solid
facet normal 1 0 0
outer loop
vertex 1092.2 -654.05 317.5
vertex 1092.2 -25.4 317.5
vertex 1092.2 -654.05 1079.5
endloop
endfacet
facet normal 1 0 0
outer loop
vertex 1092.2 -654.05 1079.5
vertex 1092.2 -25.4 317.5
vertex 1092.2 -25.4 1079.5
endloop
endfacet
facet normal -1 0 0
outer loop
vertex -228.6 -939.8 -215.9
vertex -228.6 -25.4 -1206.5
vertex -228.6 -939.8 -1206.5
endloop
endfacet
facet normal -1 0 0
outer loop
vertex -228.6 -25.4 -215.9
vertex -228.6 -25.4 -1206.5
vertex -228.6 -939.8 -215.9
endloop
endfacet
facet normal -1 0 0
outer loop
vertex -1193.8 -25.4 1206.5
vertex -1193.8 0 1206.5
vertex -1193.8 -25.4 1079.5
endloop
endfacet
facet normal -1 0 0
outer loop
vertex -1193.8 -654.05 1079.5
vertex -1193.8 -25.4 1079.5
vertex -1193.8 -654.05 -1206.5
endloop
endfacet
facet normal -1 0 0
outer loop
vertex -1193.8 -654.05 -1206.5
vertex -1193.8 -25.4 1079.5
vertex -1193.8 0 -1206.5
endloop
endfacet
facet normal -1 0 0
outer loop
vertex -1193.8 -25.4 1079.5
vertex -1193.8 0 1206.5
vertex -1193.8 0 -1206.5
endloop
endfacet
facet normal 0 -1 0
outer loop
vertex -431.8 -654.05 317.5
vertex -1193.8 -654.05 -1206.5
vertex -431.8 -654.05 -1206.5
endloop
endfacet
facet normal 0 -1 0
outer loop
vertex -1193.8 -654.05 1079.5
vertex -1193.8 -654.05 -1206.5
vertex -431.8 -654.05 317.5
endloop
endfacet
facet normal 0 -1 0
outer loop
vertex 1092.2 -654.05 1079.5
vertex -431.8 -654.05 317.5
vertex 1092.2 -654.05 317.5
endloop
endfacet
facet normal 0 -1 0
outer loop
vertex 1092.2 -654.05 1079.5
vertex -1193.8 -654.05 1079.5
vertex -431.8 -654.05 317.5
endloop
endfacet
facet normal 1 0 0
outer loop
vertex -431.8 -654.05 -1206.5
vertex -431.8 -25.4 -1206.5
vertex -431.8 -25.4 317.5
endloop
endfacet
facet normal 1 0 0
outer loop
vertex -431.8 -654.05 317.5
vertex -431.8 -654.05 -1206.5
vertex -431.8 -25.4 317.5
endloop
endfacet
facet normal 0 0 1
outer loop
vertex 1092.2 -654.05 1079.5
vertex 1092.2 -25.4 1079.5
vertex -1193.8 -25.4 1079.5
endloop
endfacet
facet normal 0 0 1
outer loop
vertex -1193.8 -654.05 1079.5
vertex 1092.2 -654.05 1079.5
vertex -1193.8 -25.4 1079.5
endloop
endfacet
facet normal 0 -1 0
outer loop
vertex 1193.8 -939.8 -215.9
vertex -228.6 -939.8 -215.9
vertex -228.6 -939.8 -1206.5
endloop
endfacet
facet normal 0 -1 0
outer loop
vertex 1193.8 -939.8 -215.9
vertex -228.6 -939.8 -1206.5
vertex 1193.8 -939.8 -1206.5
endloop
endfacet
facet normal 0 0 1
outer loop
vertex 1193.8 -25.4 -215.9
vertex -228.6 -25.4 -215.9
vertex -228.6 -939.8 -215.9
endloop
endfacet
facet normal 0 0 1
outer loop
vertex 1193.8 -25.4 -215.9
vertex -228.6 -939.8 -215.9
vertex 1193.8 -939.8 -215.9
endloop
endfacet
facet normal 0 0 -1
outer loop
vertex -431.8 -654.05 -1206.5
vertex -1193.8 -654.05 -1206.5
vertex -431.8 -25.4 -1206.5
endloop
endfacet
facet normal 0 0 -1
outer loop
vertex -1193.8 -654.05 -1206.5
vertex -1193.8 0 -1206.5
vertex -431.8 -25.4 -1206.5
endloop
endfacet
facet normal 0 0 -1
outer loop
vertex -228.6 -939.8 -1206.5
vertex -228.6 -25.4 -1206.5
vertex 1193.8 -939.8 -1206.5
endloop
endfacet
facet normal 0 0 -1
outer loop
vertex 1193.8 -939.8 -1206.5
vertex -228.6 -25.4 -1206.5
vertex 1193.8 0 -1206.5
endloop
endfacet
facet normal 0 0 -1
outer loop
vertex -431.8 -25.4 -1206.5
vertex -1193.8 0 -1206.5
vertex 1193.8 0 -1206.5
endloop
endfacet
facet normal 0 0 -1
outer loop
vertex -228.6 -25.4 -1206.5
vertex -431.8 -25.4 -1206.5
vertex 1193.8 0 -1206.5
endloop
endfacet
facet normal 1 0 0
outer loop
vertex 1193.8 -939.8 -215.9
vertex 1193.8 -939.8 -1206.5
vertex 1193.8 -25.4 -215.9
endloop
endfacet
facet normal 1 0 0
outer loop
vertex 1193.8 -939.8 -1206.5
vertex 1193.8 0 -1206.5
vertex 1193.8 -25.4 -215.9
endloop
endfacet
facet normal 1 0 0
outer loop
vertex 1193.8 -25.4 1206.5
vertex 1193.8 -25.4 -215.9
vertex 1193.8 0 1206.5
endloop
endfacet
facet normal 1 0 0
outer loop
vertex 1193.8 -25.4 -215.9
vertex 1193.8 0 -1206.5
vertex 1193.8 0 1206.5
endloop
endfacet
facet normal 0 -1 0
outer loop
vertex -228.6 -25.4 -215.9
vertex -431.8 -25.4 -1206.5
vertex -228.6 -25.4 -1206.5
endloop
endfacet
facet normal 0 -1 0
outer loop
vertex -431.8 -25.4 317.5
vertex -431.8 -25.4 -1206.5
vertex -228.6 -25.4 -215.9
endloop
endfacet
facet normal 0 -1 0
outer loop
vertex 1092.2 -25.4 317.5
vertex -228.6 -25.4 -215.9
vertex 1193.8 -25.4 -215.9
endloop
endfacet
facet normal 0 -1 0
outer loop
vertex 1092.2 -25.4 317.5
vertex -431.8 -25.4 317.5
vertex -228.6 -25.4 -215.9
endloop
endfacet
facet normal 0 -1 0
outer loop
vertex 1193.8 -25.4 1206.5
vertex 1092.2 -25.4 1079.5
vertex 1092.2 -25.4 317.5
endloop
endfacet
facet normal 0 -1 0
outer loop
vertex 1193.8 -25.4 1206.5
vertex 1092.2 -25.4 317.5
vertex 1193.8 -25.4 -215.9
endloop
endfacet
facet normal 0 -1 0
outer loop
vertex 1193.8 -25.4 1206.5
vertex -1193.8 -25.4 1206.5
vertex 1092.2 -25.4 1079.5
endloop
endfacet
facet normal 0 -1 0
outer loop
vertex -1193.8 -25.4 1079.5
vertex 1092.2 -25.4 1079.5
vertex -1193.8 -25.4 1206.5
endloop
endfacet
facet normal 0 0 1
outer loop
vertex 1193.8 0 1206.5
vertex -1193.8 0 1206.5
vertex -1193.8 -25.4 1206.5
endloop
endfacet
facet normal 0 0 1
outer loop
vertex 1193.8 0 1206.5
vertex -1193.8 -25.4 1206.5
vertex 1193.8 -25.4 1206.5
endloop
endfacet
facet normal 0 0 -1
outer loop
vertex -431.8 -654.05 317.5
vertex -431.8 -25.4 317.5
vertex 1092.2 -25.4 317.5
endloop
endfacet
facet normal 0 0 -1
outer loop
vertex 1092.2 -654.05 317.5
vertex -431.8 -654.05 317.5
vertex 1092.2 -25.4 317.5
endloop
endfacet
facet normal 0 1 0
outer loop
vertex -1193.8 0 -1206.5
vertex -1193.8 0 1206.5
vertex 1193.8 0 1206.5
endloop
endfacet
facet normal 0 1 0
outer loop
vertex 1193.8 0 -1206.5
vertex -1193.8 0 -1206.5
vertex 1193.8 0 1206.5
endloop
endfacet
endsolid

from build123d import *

# Parameters (mm, degrees)
F0_W     = 2387.6
F0_H     = 2413
F1_DEPTH = 25.4
F2_W     = 1422.4
F2_H     = 990.6
F3_DEPTH = 914.4
F4_W     = 762
F4_H     = 762
F5_DEPTH = 628.65


with BuildPart() as f1:
    # F0 (on Front) → F1 (new body)
    with BuildSketch(Plane.XZ):
        Rectangle(F0_W, F0_H)
    extrude(amount=F1_DEPTH)

    # F2 (on face) → F3 (join)
    with BuildSketch(Plane.XZ.offset(25.4)):
        with Locations((482.6, -711.2)):
            Rectangle(F2_W, F2_H)
    extrude(amount=F3_DEPTH)

    # F4 (on face) → F5 (join)
    with BuildSketch(Plane.XZ.offset(25.4)):
        Polygon((-1193.8, 1079.5), (-1193.8, -1206.5), (-431.8, -1206.5), (-431.8, 317.5), (-431.8, 1079.5), align=None)
        with Locations((-50.8, 698.5)):
            Rectangle(F4_W, F4_H)
        with Locations((711.2, 698.5)):
            Rectangle(F4_W, F4_H)
    extrude(amount=F5_DEPTH)


solid = f1.part
